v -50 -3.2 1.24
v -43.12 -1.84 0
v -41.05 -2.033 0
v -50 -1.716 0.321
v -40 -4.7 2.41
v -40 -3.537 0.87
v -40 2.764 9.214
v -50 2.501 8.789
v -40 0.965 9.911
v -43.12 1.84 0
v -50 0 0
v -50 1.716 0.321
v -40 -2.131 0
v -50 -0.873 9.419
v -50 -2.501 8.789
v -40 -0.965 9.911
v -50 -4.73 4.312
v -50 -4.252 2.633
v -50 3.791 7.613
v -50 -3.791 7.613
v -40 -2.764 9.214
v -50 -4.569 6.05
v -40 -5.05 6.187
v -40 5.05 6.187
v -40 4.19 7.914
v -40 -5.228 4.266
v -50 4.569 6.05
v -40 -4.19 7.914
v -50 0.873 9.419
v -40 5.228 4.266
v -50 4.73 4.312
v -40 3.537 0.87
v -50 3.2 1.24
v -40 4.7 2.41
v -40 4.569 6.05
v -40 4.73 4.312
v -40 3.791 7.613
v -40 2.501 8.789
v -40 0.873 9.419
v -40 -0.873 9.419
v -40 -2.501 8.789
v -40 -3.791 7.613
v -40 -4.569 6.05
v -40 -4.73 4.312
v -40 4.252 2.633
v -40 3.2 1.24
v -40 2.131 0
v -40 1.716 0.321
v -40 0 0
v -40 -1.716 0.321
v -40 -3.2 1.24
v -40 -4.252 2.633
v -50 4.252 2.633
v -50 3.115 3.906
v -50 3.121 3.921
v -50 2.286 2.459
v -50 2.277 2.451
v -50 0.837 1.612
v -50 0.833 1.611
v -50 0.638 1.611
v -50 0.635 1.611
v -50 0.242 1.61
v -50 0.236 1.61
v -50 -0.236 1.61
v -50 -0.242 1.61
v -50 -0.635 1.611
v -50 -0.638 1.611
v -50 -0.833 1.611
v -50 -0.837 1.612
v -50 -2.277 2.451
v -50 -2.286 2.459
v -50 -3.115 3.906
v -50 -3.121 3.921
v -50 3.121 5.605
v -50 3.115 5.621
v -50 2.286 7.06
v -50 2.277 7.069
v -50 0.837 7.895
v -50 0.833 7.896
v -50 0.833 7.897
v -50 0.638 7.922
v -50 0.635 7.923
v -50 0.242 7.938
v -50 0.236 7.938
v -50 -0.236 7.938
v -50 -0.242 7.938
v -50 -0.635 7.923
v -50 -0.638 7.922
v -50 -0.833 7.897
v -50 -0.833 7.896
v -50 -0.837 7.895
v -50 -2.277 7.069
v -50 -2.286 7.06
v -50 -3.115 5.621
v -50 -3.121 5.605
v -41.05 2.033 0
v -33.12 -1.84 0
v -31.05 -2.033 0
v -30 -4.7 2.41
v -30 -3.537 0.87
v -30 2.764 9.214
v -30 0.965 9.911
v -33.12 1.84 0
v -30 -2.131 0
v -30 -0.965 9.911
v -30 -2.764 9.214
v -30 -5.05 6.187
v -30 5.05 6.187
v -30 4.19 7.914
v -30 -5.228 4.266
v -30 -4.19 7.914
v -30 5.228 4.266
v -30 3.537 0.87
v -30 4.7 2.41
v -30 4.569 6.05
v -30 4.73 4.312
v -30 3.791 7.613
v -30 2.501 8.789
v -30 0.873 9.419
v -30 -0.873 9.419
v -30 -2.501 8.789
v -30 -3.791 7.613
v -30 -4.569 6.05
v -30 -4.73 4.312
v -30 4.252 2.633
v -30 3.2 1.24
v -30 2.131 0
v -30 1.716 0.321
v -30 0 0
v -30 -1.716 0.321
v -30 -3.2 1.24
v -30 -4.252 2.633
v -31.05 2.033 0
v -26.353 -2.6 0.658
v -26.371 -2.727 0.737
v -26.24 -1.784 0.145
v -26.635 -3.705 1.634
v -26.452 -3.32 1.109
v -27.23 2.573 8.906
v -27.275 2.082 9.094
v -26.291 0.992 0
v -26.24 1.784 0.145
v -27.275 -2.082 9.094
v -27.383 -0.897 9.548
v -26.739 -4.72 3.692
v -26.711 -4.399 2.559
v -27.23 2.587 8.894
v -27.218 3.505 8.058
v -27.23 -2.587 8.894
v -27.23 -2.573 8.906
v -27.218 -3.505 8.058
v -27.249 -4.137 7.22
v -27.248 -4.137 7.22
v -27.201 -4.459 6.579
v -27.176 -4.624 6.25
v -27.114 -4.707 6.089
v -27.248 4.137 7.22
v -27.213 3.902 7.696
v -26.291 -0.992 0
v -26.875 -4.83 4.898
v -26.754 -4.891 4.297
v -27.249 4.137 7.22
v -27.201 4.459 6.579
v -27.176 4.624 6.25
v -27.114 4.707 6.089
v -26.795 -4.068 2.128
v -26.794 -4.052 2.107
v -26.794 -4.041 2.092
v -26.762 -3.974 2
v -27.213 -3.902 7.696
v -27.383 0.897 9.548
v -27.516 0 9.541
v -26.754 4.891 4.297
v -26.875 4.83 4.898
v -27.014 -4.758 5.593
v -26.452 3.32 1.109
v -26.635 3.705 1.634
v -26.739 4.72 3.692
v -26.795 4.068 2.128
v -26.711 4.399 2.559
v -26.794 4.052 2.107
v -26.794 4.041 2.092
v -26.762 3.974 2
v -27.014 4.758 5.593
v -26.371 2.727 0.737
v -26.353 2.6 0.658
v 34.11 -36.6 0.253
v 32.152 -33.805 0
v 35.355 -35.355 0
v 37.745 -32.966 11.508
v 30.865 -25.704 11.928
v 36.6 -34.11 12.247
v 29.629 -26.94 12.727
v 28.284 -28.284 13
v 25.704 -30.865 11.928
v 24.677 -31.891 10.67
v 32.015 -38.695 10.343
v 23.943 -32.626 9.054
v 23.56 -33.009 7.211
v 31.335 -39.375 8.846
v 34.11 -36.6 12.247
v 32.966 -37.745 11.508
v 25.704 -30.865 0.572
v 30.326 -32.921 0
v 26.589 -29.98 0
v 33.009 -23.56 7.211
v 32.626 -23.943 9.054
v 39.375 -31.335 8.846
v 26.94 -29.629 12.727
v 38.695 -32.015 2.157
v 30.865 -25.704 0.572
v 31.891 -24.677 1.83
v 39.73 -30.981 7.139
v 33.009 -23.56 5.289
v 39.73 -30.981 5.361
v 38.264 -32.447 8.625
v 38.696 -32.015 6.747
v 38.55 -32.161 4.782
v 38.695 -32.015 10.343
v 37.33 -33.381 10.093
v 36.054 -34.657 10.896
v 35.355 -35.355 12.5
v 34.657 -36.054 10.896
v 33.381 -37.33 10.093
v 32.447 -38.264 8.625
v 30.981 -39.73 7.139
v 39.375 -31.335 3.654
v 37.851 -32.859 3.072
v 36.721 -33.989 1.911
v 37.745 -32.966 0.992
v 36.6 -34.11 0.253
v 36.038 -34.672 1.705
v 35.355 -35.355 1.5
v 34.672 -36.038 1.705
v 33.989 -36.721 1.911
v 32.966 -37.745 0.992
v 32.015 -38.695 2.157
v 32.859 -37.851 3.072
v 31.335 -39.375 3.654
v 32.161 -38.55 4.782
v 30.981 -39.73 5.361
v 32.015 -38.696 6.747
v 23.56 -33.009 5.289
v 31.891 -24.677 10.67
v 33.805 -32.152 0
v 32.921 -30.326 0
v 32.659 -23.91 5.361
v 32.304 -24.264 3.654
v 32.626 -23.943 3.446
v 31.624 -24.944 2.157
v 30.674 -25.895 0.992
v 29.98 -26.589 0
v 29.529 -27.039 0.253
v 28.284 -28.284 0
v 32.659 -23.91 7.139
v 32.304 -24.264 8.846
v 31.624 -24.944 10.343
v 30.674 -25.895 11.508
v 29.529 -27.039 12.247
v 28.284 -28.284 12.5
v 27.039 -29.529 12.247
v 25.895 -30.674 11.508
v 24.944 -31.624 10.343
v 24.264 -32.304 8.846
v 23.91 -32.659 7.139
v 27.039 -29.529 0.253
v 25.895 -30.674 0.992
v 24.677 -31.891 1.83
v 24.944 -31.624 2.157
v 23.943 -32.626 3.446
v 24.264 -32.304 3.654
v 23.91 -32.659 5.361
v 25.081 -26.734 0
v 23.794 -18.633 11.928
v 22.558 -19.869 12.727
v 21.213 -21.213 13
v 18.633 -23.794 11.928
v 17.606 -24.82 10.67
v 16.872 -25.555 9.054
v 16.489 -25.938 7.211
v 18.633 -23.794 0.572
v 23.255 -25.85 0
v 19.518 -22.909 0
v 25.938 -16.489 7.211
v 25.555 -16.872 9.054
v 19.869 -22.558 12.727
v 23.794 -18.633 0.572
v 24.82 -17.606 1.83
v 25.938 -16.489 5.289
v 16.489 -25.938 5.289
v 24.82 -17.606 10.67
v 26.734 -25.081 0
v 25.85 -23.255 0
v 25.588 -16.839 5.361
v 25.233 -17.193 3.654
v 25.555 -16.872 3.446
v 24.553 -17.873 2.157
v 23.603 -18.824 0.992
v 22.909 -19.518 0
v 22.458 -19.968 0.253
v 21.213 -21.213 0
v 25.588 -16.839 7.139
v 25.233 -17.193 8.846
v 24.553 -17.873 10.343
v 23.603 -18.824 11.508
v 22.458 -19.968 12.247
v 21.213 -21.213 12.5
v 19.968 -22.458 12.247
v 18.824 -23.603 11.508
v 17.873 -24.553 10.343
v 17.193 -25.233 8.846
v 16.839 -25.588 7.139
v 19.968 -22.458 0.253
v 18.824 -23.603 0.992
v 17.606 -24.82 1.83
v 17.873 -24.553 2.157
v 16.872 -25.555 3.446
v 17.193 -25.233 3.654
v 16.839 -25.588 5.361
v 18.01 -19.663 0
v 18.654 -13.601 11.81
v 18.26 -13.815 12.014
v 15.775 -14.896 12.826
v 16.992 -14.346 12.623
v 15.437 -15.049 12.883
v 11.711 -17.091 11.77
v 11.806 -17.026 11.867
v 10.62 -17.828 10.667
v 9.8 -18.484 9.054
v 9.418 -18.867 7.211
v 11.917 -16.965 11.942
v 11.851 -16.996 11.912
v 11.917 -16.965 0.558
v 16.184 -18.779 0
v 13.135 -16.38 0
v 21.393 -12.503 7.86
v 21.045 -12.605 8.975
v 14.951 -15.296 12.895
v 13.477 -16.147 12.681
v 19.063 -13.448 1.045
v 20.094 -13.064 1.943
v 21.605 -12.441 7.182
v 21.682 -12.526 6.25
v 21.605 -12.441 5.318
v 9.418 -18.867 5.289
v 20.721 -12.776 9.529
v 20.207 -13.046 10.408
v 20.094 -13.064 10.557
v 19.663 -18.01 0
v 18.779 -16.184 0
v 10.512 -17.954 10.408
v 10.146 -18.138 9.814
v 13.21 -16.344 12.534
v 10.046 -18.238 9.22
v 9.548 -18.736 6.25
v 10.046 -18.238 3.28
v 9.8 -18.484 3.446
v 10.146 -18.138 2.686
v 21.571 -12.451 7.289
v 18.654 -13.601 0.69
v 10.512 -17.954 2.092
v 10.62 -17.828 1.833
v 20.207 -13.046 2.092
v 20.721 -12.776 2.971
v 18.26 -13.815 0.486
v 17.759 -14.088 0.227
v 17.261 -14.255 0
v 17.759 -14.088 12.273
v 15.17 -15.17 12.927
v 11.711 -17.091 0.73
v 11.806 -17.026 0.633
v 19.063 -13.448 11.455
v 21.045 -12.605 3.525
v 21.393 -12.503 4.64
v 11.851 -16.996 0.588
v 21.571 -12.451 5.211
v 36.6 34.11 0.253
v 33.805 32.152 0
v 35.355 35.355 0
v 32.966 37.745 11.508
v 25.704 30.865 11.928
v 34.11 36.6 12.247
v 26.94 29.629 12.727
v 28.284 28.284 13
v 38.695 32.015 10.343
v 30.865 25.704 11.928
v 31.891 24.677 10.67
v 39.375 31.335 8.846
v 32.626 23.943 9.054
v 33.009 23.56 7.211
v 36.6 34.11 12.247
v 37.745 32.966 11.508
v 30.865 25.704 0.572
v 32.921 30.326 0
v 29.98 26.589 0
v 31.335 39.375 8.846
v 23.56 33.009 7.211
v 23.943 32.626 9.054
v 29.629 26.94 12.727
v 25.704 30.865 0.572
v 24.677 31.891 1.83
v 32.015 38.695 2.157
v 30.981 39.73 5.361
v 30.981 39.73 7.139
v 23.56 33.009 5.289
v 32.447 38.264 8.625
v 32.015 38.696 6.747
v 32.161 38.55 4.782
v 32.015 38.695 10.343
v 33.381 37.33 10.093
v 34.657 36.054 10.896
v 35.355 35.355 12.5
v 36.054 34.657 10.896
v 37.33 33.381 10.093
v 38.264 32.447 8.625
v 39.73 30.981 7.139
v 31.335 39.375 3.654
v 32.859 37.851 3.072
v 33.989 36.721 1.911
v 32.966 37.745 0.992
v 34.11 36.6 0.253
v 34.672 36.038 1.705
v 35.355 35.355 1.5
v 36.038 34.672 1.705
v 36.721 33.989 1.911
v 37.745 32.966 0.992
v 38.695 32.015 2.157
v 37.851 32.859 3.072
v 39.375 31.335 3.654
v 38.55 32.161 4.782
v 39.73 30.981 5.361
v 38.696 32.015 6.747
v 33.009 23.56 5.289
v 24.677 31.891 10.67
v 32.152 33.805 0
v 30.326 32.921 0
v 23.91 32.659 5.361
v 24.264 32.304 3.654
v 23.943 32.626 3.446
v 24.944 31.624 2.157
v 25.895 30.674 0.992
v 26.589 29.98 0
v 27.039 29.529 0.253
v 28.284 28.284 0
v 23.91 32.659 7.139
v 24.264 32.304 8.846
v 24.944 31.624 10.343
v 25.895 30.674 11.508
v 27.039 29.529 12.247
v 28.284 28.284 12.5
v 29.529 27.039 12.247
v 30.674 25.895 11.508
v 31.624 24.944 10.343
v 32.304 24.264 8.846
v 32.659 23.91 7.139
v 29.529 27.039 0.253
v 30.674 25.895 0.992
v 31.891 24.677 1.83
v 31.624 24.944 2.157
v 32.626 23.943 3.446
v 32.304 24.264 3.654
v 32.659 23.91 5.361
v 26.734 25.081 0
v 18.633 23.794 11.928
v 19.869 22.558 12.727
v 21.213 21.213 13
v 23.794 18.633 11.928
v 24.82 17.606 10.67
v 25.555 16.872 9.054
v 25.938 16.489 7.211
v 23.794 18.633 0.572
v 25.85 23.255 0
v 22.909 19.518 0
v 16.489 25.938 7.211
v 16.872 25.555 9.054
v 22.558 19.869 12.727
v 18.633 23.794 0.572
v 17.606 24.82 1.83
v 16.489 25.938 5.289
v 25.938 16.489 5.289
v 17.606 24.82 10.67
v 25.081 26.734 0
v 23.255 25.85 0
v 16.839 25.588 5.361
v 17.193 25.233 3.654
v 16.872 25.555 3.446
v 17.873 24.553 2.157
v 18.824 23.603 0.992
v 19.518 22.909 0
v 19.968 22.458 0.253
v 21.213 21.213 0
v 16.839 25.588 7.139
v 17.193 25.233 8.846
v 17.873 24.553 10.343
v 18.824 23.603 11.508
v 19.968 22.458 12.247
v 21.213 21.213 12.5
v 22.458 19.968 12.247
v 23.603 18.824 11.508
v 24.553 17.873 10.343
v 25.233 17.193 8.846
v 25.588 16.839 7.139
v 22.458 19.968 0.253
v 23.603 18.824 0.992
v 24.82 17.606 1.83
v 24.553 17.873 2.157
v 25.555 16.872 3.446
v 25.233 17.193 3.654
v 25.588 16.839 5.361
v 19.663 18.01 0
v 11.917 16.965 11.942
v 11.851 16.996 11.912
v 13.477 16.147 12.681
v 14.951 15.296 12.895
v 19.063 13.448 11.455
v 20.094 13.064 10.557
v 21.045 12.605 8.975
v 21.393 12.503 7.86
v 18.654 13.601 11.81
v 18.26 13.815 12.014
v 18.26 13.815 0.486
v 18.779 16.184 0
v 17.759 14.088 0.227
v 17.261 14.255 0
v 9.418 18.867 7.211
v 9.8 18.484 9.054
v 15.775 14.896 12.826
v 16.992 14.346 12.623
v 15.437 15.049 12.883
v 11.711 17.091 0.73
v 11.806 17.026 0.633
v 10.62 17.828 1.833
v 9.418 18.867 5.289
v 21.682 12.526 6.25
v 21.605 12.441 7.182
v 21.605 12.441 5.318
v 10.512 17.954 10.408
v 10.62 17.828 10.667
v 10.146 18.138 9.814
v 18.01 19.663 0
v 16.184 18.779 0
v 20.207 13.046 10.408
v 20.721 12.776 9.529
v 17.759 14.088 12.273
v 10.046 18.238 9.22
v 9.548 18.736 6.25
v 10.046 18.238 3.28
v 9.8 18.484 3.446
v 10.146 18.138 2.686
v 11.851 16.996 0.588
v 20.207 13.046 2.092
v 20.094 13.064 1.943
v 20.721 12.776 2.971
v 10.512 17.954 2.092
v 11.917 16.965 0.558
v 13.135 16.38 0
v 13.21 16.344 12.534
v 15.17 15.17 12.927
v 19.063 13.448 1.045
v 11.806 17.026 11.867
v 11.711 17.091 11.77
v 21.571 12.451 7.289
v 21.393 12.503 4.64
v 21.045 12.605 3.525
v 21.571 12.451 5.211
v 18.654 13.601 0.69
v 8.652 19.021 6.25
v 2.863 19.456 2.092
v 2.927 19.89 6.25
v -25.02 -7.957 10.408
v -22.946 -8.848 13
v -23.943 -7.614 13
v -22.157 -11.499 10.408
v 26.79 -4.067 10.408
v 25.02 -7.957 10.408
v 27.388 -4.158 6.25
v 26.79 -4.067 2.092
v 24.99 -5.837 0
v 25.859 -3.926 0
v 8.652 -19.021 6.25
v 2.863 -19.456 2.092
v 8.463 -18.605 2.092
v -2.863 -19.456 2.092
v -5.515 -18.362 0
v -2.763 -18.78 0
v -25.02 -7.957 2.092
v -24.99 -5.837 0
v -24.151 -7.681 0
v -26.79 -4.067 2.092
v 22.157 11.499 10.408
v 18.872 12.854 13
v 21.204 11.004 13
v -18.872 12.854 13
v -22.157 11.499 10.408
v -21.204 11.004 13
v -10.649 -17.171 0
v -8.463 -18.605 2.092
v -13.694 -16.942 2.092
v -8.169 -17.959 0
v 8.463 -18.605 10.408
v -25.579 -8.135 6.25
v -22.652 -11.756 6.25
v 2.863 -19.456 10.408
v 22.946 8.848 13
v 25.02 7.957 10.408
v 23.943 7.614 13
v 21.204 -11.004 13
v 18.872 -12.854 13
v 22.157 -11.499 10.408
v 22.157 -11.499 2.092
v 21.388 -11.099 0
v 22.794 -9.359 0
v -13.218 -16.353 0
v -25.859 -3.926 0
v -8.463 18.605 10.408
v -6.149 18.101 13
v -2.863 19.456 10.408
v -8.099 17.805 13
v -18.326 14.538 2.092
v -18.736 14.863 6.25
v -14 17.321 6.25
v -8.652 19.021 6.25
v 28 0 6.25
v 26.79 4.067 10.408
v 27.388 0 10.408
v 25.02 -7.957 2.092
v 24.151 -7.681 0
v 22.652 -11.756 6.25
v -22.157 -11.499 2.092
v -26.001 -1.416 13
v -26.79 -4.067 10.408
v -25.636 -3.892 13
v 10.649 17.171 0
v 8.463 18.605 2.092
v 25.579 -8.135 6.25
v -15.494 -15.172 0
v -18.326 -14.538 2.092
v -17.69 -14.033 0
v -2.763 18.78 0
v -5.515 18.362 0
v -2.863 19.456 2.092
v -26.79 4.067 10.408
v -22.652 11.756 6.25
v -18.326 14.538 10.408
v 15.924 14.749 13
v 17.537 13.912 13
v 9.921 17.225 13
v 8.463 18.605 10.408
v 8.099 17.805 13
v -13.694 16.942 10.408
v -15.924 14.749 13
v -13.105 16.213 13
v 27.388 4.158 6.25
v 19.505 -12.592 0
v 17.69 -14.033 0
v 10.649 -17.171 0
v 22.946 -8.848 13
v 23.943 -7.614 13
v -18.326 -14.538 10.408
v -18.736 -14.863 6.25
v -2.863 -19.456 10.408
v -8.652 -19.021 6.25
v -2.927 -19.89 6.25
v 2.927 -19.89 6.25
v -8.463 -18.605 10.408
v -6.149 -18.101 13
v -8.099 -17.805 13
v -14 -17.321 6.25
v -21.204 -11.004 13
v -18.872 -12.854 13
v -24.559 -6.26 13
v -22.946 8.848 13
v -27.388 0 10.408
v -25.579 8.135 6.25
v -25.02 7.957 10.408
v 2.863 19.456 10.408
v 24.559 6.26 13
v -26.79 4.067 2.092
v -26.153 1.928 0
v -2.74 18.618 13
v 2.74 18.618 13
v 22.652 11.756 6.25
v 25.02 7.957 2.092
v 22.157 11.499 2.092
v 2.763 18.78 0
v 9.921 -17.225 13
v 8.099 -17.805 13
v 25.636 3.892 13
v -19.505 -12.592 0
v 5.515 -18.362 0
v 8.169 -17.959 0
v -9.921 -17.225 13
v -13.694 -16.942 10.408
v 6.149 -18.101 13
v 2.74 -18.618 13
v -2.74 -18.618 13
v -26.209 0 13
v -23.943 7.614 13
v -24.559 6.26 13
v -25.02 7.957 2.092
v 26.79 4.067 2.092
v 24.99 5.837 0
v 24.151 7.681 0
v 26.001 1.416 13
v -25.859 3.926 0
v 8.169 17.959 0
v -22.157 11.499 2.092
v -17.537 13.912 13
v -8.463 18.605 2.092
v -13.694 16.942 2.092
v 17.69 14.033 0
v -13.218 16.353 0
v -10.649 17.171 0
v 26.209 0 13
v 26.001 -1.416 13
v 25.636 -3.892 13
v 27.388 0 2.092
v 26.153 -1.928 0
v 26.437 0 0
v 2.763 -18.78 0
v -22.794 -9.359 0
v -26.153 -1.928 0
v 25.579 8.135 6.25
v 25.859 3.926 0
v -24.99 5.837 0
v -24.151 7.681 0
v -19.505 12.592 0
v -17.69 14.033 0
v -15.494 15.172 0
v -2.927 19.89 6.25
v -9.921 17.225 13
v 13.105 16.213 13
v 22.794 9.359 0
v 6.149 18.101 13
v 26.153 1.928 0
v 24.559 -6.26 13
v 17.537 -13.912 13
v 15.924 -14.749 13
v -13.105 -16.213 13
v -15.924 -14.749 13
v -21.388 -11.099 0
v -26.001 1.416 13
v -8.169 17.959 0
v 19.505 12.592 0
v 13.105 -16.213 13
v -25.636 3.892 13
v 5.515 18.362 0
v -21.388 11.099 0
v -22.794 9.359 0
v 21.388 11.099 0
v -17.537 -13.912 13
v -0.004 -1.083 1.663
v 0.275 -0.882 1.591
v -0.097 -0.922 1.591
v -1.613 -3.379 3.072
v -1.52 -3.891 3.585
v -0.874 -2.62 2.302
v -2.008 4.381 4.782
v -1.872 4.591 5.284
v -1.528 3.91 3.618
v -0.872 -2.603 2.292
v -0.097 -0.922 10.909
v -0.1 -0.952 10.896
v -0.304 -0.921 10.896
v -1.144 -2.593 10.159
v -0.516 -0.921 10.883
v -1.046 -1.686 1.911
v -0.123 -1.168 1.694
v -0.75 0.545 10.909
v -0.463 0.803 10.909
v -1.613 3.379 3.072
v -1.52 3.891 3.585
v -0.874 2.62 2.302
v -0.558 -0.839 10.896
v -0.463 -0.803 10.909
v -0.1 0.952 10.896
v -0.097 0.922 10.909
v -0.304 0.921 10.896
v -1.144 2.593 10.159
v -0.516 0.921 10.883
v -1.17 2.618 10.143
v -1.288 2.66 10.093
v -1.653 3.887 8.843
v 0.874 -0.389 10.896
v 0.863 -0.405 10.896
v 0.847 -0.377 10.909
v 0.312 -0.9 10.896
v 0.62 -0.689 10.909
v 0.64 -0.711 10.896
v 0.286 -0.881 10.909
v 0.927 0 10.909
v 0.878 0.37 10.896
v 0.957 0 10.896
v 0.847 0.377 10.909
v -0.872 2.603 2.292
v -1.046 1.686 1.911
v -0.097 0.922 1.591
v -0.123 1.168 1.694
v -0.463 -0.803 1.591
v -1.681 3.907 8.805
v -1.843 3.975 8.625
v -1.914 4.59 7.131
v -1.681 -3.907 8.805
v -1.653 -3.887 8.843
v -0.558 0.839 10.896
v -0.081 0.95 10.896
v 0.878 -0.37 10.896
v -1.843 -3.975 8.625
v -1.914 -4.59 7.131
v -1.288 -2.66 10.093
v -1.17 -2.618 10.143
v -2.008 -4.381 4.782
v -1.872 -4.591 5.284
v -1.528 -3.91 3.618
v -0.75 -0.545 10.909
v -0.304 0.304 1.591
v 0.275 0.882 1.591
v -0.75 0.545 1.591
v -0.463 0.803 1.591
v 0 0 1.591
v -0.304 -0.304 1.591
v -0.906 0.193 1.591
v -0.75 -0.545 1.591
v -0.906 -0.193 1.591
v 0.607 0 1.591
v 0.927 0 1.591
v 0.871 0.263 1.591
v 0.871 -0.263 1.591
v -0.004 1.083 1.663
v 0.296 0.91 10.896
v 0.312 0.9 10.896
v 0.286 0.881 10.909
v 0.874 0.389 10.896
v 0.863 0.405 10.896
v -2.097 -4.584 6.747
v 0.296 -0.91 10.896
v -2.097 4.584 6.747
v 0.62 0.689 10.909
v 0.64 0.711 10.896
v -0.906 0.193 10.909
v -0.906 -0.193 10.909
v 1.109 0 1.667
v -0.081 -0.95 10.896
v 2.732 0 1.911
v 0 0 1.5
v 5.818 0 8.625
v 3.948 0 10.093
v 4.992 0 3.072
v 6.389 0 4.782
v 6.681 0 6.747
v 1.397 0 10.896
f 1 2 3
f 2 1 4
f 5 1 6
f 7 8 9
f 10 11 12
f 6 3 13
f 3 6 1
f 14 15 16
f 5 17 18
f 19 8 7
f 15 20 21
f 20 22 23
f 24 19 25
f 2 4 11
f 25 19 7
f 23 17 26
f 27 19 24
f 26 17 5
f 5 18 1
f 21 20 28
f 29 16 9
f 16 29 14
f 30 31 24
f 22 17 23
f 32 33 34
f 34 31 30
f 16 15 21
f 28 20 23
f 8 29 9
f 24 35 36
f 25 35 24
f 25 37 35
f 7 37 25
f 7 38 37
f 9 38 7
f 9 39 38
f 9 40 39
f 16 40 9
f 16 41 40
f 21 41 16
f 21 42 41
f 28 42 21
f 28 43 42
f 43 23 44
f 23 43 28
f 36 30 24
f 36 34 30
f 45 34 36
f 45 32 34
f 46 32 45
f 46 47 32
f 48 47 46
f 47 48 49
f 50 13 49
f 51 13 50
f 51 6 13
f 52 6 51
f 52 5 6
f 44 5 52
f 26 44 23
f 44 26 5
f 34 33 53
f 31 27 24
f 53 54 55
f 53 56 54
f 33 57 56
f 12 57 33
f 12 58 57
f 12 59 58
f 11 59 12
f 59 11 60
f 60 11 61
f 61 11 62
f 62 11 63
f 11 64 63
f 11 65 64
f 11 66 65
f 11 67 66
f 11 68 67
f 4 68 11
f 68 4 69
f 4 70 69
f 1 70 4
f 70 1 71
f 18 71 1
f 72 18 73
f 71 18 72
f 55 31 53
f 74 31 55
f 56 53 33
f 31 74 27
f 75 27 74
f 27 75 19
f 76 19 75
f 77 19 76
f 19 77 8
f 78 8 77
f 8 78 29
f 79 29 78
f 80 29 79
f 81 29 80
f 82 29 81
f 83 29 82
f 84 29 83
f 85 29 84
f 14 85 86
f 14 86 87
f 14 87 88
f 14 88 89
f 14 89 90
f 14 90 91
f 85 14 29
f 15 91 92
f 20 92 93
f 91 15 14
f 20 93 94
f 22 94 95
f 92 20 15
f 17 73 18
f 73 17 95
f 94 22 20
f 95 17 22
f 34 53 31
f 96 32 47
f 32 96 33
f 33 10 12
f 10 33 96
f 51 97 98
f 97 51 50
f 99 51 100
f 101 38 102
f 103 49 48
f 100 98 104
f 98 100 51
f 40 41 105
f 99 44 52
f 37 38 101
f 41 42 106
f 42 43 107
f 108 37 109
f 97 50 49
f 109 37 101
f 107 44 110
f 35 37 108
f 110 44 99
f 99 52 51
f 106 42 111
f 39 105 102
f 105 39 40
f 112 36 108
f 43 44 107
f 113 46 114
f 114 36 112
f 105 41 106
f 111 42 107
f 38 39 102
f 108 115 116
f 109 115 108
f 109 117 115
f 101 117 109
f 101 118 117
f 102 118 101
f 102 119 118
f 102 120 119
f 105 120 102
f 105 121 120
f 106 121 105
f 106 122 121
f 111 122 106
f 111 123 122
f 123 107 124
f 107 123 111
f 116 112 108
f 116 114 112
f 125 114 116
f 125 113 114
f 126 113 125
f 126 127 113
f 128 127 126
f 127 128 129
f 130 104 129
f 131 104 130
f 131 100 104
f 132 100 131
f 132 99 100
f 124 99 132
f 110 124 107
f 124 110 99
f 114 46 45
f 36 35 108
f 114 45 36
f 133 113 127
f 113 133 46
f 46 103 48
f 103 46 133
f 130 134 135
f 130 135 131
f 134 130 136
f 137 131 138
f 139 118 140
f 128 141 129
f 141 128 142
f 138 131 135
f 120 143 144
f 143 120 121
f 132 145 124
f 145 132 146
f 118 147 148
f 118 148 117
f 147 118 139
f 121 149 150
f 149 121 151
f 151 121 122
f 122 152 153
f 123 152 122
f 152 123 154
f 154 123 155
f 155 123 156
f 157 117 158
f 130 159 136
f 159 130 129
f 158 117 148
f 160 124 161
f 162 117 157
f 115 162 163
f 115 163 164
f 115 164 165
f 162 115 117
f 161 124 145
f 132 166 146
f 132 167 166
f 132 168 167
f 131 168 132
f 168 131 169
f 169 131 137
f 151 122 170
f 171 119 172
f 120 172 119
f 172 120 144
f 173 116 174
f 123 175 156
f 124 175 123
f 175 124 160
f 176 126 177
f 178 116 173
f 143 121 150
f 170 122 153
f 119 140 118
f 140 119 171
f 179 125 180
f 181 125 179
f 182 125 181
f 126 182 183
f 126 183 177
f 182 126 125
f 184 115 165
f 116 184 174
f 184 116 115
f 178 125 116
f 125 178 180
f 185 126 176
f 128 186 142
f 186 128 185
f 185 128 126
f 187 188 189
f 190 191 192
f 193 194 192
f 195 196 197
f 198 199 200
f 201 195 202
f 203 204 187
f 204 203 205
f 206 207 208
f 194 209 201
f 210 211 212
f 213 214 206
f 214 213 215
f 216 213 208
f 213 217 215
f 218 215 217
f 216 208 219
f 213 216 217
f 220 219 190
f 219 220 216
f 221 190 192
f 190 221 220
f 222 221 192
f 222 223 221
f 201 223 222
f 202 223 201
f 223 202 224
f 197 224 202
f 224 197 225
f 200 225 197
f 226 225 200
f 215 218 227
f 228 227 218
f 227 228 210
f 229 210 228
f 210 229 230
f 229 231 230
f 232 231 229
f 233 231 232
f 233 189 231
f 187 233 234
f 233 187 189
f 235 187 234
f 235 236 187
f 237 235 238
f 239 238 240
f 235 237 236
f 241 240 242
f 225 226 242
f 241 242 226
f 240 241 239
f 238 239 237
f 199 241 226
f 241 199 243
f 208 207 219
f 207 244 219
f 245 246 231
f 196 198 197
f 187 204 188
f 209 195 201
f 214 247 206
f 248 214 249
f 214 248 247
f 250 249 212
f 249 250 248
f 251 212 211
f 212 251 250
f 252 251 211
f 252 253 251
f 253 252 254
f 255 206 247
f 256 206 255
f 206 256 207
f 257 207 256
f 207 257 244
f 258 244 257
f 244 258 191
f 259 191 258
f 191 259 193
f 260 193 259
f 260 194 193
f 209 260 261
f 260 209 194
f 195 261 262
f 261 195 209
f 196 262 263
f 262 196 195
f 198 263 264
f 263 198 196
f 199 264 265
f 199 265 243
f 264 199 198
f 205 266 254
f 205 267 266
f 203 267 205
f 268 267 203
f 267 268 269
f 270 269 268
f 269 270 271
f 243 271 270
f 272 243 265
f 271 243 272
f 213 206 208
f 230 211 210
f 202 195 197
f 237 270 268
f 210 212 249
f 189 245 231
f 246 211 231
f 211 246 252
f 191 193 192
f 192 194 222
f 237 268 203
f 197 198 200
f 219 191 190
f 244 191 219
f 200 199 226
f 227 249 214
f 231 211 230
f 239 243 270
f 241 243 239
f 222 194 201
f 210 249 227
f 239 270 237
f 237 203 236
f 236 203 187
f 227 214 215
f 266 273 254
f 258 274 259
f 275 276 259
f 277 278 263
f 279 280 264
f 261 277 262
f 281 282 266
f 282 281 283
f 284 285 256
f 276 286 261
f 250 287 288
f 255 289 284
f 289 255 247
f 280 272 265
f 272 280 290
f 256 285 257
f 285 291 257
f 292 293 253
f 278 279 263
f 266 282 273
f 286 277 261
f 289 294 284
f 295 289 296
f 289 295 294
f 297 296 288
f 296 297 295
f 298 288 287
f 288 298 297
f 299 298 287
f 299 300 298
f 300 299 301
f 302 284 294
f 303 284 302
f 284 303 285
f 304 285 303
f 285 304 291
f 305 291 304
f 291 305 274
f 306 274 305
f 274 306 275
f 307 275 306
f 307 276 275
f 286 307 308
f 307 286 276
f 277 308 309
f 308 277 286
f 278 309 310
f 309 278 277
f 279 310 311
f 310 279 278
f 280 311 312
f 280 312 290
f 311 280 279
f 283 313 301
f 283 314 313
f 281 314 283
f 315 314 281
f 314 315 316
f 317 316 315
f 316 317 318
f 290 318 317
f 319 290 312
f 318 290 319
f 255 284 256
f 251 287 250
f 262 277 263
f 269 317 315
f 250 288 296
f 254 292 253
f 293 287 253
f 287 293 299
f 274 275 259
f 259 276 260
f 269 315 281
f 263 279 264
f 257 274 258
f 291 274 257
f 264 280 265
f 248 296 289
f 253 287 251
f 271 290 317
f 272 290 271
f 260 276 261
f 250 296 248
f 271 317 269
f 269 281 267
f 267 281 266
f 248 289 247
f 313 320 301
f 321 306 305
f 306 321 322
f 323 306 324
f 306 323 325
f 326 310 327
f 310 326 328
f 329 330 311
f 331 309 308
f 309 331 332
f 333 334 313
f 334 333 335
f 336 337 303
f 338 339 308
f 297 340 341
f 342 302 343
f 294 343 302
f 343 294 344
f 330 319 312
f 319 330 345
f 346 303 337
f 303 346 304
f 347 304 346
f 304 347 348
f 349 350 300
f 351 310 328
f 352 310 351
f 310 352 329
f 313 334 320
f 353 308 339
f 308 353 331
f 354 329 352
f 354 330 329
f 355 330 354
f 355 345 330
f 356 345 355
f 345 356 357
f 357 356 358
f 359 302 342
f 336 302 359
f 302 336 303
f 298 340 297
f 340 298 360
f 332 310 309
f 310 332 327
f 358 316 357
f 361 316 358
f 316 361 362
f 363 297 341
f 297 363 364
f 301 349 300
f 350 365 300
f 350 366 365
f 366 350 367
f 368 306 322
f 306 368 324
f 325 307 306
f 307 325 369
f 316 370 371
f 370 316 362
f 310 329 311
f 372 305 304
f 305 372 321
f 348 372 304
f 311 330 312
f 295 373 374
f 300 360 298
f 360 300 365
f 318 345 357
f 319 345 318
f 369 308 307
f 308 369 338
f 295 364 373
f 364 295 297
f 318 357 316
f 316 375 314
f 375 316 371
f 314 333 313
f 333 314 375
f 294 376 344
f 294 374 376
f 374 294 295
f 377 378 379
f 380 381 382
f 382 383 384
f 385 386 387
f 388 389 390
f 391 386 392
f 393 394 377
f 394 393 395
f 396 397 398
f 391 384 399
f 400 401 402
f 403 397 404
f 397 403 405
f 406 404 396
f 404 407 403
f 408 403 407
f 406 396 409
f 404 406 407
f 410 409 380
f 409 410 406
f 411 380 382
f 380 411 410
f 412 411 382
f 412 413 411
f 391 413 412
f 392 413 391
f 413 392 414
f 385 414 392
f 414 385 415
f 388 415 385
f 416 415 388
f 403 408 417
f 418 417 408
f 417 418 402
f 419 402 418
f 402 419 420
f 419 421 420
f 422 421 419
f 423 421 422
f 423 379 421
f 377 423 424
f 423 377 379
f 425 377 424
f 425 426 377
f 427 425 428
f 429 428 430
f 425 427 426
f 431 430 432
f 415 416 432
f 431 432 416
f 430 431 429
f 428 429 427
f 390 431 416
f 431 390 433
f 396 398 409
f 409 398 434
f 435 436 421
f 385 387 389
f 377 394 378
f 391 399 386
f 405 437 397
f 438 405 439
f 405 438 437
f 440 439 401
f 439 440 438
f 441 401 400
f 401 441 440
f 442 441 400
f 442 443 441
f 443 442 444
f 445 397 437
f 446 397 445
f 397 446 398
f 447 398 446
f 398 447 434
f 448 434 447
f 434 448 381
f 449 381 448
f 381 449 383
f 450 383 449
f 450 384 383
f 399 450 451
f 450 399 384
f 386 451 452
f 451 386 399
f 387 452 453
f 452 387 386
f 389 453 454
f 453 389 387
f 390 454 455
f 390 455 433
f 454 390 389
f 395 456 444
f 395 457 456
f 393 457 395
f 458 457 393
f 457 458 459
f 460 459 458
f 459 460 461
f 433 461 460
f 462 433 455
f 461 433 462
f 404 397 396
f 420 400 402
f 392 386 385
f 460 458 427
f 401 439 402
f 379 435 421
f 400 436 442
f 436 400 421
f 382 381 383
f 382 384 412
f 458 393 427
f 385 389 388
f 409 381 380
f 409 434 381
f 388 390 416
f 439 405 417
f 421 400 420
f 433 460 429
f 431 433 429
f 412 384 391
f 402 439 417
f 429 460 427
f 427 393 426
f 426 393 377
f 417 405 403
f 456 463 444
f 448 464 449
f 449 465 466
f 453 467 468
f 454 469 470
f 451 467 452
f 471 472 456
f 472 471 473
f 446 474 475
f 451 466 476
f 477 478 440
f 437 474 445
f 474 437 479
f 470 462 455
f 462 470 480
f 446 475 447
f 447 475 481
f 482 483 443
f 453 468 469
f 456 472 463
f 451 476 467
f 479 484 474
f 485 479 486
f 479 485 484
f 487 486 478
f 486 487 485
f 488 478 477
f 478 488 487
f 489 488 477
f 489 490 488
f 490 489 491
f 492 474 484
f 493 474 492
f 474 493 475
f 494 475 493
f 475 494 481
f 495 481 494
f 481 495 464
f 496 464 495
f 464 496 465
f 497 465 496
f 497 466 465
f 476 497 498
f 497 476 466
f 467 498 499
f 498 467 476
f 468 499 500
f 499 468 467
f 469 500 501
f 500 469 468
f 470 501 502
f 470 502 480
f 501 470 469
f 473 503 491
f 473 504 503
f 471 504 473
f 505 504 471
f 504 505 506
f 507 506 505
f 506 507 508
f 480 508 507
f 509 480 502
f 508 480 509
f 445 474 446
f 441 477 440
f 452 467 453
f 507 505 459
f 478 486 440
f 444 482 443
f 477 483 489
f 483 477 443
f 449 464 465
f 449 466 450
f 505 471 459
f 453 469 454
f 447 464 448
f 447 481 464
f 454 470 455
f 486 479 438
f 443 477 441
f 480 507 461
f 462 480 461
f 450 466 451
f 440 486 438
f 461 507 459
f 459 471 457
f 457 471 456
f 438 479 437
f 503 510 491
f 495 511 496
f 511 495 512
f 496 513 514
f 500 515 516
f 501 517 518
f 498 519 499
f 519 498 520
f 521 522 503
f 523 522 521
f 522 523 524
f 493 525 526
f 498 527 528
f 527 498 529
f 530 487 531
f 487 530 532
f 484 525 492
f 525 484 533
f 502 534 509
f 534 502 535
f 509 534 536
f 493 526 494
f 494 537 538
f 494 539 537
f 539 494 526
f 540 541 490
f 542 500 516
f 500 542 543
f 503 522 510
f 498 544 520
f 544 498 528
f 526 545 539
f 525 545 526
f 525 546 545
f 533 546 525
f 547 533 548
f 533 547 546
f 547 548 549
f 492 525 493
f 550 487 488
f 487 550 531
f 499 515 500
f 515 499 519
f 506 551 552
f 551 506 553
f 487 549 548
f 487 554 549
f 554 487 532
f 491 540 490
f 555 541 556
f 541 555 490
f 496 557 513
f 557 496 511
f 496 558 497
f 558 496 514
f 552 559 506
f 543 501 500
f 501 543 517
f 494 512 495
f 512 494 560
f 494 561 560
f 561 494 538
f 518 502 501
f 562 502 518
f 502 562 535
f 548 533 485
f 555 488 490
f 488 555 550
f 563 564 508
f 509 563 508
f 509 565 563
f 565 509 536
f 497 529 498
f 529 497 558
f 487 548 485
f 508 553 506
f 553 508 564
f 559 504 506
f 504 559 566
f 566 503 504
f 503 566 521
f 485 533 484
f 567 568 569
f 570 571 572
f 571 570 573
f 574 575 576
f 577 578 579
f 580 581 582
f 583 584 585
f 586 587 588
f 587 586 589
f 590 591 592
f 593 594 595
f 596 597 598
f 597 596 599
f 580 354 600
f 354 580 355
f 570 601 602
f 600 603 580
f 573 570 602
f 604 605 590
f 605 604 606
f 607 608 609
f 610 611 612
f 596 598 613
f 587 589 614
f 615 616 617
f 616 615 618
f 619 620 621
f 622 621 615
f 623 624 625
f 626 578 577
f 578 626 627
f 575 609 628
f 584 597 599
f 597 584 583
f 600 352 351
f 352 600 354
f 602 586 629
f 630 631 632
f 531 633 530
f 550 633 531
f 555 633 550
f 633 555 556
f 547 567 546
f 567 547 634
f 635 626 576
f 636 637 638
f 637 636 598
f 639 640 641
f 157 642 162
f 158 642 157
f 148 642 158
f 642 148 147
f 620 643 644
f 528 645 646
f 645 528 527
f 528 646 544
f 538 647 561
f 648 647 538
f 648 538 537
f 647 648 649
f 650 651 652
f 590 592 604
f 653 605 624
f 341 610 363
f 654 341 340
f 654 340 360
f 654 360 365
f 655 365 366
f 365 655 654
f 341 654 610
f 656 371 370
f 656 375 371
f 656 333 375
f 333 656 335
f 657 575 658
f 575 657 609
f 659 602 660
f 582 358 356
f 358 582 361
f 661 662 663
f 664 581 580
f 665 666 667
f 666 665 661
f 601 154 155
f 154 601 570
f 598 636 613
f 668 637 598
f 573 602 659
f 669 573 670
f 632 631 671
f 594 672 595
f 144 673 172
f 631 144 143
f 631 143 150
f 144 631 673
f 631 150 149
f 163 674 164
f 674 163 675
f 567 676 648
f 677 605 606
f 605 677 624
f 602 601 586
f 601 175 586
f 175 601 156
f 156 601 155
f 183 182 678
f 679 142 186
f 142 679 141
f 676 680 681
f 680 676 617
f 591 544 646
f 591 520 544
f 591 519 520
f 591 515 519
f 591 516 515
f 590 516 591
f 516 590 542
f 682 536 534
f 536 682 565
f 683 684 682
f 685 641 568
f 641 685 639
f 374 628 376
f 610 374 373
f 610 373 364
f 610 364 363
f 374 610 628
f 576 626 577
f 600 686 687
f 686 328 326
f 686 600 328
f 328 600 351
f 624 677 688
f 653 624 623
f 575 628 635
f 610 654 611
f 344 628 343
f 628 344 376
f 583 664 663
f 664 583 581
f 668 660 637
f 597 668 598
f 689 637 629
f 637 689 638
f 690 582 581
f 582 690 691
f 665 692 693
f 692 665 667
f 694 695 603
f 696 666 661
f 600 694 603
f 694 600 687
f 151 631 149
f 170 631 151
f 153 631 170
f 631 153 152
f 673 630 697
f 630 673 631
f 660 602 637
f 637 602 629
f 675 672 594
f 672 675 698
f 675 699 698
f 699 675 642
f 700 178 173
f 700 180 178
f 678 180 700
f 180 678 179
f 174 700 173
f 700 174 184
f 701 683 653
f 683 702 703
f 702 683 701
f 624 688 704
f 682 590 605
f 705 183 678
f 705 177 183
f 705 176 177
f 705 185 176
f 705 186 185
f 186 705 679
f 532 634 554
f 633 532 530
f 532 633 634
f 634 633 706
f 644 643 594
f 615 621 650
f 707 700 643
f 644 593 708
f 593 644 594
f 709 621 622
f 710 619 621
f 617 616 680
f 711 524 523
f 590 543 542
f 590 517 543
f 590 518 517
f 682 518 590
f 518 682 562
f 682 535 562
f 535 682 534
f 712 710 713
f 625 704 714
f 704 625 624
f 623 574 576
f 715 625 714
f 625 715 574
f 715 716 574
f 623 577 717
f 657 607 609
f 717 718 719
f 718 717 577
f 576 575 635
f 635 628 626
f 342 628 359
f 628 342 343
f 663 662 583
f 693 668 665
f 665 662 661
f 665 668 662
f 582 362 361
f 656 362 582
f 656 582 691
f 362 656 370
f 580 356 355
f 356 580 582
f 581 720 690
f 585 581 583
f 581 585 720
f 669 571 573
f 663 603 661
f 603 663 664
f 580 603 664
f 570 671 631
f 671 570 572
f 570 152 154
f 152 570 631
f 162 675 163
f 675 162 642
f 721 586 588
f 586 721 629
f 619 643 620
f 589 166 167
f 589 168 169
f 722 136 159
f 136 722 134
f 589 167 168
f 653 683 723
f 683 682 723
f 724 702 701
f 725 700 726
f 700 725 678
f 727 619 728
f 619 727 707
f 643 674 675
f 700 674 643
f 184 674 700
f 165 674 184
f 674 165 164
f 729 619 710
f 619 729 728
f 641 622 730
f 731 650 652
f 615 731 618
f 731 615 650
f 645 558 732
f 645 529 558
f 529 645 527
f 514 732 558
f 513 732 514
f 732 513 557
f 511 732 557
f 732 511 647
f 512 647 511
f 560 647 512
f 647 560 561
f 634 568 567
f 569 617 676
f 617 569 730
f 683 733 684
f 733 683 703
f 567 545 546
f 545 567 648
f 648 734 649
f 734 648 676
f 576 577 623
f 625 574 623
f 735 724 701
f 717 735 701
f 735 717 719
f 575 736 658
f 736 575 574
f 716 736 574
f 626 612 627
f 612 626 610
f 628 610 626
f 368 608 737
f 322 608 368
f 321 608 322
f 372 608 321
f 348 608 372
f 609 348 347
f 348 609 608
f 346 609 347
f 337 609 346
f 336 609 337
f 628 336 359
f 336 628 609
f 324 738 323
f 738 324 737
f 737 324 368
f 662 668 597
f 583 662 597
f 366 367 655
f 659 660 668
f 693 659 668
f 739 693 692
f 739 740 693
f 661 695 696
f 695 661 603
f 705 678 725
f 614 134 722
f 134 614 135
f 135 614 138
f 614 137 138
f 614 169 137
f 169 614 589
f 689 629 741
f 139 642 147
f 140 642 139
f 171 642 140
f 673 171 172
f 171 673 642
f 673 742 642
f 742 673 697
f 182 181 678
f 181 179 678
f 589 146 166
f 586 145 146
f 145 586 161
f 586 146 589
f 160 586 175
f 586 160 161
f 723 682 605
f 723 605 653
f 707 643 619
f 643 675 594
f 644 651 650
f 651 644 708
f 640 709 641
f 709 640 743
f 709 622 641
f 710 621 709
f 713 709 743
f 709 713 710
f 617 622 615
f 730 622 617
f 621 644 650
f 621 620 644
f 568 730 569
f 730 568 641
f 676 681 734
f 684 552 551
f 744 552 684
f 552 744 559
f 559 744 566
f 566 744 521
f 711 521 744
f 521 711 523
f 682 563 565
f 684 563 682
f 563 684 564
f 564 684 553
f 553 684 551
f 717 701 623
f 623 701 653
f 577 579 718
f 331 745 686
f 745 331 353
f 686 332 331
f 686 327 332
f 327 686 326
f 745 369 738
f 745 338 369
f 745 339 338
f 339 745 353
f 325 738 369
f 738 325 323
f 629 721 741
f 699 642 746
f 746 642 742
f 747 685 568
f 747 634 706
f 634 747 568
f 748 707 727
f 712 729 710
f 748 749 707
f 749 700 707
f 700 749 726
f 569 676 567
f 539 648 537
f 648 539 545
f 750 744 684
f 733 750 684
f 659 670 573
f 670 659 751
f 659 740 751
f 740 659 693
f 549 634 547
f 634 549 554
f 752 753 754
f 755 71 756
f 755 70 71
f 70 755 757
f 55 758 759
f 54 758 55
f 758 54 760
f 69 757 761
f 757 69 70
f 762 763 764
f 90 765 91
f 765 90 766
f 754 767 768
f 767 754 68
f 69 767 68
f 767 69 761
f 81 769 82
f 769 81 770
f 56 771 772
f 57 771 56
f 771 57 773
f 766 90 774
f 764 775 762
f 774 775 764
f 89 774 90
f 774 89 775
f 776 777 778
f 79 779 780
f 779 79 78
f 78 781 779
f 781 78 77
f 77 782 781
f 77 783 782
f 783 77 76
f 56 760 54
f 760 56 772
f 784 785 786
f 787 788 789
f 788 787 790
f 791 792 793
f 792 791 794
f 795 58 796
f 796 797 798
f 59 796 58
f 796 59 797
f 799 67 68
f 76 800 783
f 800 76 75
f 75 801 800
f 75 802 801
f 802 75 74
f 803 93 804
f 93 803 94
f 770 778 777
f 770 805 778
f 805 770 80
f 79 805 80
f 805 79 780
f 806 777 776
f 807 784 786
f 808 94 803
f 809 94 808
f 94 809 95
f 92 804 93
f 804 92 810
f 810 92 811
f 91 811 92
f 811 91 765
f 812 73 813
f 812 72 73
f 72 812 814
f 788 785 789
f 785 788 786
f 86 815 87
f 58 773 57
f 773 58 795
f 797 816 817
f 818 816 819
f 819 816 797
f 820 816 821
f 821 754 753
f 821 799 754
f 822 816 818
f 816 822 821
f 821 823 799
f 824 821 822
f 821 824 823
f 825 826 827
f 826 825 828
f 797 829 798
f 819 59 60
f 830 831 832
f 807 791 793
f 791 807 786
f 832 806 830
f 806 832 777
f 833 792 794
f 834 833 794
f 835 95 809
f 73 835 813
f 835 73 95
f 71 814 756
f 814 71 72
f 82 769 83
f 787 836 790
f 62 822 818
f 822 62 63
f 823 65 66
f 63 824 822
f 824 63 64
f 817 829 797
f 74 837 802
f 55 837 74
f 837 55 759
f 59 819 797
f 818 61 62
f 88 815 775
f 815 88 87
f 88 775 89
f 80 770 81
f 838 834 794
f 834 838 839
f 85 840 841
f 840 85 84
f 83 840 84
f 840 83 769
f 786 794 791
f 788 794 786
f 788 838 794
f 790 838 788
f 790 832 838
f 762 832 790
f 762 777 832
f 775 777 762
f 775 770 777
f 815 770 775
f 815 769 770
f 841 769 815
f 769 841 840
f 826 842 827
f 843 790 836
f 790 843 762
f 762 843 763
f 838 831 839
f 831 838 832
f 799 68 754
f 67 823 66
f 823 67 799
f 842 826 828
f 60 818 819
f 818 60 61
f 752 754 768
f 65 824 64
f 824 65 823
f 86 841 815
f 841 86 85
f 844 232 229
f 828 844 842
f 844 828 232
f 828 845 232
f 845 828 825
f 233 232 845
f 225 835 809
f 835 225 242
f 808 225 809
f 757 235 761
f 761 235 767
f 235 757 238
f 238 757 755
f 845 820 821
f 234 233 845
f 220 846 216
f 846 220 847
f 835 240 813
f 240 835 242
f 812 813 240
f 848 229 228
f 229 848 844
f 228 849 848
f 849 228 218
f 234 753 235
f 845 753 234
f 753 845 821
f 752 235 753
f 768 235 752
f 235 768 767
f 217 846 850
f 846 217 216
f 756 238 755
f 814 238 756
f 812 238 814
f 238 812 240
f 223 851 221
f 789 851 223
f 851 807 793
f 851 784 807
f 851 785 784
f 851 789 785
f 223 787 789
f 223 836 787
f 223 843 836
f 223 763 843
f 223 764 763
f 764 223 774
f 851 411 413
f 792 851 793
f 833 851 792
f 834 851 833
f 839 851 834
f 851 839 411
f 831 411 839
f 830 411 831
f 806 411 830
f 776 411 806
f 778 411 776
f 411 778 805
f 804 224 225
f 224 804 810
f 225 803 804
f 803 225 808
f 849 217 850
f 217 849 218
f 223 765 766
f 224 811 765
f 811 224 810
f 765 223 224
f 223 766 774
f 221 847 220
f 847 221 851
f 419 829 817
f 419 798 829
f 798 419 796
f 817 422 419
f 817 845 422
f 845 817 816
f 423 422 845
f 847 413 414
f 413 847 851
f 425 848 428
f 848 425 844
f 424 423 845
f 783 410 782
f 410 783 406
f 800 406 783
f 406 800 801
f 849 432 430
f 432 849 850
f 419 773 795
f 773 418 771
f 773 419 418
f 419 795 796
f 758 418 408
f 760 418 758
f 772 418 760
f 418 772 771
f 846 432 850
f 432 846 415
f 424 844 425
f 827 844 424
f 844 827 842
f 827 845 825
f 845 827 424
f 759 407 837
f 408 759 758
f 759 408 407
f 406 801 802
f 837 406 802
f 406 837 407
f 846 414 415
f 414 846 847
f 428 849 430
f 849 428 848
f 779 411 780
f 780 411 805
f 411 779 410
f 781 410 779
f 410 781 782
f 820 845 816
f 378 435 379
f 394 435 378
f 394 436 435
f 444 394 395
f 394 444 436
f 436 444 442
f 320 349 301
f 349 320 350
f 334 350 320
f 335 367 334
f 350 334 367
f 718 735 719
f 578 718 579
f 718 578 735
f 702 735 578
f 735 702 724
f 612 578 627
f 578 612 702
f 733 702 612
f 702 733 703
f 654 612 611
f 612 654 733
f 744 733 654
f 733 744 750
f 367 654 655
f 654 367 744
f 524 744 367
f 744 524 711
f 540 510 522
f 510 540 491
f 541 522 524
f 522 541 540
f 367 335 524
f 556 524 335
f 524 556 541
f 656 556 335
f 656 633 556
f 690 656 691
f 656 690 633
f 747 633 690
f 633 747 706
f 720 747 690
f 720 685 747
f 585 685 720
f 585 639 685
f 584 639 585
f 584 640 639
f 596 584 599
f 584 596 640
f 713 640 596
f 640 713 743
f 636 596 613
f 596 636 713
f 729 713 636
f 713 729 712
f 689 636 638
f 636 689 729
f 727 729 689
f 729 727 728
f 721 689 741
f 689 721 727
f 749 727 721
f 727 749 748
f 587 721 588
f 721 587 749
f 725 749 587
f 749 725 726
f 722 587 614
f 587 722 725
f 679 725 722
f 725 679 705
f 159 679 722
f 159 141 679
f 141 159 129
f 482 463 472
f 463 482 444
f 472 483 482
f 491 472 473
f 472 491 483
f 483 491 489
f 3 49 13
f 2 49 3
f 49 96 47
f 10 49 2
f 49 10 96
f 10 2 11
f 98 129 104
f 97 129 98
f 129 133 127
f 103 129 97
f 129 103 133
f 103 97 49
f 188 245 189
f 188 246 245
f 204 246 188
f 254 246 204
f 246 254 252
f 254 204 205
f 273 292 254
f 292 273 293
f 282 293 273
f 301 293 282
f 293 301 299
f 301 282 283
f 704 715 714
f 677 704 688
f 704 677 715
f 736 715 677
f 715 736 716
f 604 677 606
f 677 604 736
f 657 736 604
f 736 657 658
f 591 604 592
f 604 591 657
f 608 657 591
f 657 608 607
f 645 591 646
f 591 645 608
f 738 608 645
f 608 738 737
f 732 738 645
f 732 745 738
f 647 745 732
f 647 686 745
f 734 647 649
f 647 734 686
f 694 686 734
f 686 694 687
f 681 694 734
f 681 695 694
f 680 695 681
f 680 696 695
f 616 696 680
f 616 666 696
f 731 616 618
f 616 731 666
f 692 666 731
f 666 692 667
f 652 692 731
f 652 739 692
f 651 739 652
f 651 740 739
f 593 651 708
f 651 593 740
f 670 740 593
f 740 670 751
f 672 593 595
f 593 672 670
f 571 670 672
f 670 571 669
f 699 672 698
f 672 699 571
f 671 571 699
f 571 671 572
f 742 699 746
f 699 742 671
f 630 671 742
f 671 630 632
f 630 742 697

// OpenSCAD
//$fn=100;

dOuterSmall=12.5/2;
dOuterBig=13.5/2;

dInnerSmall=9.5/2;
dInnerBig=10.5/2;

dDepth=3/2;
dHeight=10;


tFitting_10_2x13();
//terminator_13();


module tFitting_10_2x13() {
	translate([0, 0, dOuterSmall]) _all();
}

module terminator_13() {
	terminator(dHeight, dOuterSmall, dOuterBig);
}




module terminator(height, small, big) {
	cylinder(h=height, r1=small, r2=big);
	translate([0, 0, height]) cylinder(h=height, r1=small, r2=big);
	translate([0, 0, 2*height]) cylinder(h=height, r1=small, r2=big);
	translate([0, 0, 3*height]) cylinder(h=3, r1=big, r2=big+3);
	translate([0, 0, 3*height+3]) cylinder(h=1.5, r=big+3);
}


module _all() {
	difference() {
		_connections();
		translate([-100, -100, -200-dOuterSmall]) cube(200);
		_star();
		translate([-100, -100, dOuterBig]) cube(200);
	}
}

module _star() {
	union() {
		hull() {
			translate([0, 0, 0]) sphere(r=dOuterSmall-dDepth);
			translate([-5*dHeight, 0, dInnerSmall-dOuterSmall]) sphere(r=dInnerSmall-dDepth);
		}
		rotate(a=[0, 90, 135+180]) cylinder(r=dOuterSmall-dDepth, h=100);
		rotate(a=[0, 90, 225+180]) cylinder(r=dOuterSmall-dDepth, h=100);
	}
}

module _connections() {
	union() {
		scale([1.4, 1, 1]) sphere(r=20);
		translate([-5*dHeight, 0, dInnerSmall-dOuterSmall]) _fitting(dHeight, dInnerSmall, dInnerBig);
		rotate(a=[0, 0, 135]) translate([-5*dHeight, 0, 0]) _fitting(dHeight, dOuterSmall, dOuterBig);
		rotate(a=[0, 0, 225]) translate([-5*dHeight, 0, 0]) _fitting(dHeight, dOuterSmall, dOuterBig);
	}
}

module _fitting(height, small, big) {
	rotate(a=[0, 90, 0]) {
		union() {
			cylinder(h=height, r1=small, r2=big);
			translate([0, 0, 1*height]) cylinder(h=height, r1=small, r2=big);
			translate([0, 0, 2*height]) cylinder(h=height, r1=small, r2=big);
			translate([0, 0, 3*height]) cylinder(h=height, r1=small, r2=big);
		}
	}
}
